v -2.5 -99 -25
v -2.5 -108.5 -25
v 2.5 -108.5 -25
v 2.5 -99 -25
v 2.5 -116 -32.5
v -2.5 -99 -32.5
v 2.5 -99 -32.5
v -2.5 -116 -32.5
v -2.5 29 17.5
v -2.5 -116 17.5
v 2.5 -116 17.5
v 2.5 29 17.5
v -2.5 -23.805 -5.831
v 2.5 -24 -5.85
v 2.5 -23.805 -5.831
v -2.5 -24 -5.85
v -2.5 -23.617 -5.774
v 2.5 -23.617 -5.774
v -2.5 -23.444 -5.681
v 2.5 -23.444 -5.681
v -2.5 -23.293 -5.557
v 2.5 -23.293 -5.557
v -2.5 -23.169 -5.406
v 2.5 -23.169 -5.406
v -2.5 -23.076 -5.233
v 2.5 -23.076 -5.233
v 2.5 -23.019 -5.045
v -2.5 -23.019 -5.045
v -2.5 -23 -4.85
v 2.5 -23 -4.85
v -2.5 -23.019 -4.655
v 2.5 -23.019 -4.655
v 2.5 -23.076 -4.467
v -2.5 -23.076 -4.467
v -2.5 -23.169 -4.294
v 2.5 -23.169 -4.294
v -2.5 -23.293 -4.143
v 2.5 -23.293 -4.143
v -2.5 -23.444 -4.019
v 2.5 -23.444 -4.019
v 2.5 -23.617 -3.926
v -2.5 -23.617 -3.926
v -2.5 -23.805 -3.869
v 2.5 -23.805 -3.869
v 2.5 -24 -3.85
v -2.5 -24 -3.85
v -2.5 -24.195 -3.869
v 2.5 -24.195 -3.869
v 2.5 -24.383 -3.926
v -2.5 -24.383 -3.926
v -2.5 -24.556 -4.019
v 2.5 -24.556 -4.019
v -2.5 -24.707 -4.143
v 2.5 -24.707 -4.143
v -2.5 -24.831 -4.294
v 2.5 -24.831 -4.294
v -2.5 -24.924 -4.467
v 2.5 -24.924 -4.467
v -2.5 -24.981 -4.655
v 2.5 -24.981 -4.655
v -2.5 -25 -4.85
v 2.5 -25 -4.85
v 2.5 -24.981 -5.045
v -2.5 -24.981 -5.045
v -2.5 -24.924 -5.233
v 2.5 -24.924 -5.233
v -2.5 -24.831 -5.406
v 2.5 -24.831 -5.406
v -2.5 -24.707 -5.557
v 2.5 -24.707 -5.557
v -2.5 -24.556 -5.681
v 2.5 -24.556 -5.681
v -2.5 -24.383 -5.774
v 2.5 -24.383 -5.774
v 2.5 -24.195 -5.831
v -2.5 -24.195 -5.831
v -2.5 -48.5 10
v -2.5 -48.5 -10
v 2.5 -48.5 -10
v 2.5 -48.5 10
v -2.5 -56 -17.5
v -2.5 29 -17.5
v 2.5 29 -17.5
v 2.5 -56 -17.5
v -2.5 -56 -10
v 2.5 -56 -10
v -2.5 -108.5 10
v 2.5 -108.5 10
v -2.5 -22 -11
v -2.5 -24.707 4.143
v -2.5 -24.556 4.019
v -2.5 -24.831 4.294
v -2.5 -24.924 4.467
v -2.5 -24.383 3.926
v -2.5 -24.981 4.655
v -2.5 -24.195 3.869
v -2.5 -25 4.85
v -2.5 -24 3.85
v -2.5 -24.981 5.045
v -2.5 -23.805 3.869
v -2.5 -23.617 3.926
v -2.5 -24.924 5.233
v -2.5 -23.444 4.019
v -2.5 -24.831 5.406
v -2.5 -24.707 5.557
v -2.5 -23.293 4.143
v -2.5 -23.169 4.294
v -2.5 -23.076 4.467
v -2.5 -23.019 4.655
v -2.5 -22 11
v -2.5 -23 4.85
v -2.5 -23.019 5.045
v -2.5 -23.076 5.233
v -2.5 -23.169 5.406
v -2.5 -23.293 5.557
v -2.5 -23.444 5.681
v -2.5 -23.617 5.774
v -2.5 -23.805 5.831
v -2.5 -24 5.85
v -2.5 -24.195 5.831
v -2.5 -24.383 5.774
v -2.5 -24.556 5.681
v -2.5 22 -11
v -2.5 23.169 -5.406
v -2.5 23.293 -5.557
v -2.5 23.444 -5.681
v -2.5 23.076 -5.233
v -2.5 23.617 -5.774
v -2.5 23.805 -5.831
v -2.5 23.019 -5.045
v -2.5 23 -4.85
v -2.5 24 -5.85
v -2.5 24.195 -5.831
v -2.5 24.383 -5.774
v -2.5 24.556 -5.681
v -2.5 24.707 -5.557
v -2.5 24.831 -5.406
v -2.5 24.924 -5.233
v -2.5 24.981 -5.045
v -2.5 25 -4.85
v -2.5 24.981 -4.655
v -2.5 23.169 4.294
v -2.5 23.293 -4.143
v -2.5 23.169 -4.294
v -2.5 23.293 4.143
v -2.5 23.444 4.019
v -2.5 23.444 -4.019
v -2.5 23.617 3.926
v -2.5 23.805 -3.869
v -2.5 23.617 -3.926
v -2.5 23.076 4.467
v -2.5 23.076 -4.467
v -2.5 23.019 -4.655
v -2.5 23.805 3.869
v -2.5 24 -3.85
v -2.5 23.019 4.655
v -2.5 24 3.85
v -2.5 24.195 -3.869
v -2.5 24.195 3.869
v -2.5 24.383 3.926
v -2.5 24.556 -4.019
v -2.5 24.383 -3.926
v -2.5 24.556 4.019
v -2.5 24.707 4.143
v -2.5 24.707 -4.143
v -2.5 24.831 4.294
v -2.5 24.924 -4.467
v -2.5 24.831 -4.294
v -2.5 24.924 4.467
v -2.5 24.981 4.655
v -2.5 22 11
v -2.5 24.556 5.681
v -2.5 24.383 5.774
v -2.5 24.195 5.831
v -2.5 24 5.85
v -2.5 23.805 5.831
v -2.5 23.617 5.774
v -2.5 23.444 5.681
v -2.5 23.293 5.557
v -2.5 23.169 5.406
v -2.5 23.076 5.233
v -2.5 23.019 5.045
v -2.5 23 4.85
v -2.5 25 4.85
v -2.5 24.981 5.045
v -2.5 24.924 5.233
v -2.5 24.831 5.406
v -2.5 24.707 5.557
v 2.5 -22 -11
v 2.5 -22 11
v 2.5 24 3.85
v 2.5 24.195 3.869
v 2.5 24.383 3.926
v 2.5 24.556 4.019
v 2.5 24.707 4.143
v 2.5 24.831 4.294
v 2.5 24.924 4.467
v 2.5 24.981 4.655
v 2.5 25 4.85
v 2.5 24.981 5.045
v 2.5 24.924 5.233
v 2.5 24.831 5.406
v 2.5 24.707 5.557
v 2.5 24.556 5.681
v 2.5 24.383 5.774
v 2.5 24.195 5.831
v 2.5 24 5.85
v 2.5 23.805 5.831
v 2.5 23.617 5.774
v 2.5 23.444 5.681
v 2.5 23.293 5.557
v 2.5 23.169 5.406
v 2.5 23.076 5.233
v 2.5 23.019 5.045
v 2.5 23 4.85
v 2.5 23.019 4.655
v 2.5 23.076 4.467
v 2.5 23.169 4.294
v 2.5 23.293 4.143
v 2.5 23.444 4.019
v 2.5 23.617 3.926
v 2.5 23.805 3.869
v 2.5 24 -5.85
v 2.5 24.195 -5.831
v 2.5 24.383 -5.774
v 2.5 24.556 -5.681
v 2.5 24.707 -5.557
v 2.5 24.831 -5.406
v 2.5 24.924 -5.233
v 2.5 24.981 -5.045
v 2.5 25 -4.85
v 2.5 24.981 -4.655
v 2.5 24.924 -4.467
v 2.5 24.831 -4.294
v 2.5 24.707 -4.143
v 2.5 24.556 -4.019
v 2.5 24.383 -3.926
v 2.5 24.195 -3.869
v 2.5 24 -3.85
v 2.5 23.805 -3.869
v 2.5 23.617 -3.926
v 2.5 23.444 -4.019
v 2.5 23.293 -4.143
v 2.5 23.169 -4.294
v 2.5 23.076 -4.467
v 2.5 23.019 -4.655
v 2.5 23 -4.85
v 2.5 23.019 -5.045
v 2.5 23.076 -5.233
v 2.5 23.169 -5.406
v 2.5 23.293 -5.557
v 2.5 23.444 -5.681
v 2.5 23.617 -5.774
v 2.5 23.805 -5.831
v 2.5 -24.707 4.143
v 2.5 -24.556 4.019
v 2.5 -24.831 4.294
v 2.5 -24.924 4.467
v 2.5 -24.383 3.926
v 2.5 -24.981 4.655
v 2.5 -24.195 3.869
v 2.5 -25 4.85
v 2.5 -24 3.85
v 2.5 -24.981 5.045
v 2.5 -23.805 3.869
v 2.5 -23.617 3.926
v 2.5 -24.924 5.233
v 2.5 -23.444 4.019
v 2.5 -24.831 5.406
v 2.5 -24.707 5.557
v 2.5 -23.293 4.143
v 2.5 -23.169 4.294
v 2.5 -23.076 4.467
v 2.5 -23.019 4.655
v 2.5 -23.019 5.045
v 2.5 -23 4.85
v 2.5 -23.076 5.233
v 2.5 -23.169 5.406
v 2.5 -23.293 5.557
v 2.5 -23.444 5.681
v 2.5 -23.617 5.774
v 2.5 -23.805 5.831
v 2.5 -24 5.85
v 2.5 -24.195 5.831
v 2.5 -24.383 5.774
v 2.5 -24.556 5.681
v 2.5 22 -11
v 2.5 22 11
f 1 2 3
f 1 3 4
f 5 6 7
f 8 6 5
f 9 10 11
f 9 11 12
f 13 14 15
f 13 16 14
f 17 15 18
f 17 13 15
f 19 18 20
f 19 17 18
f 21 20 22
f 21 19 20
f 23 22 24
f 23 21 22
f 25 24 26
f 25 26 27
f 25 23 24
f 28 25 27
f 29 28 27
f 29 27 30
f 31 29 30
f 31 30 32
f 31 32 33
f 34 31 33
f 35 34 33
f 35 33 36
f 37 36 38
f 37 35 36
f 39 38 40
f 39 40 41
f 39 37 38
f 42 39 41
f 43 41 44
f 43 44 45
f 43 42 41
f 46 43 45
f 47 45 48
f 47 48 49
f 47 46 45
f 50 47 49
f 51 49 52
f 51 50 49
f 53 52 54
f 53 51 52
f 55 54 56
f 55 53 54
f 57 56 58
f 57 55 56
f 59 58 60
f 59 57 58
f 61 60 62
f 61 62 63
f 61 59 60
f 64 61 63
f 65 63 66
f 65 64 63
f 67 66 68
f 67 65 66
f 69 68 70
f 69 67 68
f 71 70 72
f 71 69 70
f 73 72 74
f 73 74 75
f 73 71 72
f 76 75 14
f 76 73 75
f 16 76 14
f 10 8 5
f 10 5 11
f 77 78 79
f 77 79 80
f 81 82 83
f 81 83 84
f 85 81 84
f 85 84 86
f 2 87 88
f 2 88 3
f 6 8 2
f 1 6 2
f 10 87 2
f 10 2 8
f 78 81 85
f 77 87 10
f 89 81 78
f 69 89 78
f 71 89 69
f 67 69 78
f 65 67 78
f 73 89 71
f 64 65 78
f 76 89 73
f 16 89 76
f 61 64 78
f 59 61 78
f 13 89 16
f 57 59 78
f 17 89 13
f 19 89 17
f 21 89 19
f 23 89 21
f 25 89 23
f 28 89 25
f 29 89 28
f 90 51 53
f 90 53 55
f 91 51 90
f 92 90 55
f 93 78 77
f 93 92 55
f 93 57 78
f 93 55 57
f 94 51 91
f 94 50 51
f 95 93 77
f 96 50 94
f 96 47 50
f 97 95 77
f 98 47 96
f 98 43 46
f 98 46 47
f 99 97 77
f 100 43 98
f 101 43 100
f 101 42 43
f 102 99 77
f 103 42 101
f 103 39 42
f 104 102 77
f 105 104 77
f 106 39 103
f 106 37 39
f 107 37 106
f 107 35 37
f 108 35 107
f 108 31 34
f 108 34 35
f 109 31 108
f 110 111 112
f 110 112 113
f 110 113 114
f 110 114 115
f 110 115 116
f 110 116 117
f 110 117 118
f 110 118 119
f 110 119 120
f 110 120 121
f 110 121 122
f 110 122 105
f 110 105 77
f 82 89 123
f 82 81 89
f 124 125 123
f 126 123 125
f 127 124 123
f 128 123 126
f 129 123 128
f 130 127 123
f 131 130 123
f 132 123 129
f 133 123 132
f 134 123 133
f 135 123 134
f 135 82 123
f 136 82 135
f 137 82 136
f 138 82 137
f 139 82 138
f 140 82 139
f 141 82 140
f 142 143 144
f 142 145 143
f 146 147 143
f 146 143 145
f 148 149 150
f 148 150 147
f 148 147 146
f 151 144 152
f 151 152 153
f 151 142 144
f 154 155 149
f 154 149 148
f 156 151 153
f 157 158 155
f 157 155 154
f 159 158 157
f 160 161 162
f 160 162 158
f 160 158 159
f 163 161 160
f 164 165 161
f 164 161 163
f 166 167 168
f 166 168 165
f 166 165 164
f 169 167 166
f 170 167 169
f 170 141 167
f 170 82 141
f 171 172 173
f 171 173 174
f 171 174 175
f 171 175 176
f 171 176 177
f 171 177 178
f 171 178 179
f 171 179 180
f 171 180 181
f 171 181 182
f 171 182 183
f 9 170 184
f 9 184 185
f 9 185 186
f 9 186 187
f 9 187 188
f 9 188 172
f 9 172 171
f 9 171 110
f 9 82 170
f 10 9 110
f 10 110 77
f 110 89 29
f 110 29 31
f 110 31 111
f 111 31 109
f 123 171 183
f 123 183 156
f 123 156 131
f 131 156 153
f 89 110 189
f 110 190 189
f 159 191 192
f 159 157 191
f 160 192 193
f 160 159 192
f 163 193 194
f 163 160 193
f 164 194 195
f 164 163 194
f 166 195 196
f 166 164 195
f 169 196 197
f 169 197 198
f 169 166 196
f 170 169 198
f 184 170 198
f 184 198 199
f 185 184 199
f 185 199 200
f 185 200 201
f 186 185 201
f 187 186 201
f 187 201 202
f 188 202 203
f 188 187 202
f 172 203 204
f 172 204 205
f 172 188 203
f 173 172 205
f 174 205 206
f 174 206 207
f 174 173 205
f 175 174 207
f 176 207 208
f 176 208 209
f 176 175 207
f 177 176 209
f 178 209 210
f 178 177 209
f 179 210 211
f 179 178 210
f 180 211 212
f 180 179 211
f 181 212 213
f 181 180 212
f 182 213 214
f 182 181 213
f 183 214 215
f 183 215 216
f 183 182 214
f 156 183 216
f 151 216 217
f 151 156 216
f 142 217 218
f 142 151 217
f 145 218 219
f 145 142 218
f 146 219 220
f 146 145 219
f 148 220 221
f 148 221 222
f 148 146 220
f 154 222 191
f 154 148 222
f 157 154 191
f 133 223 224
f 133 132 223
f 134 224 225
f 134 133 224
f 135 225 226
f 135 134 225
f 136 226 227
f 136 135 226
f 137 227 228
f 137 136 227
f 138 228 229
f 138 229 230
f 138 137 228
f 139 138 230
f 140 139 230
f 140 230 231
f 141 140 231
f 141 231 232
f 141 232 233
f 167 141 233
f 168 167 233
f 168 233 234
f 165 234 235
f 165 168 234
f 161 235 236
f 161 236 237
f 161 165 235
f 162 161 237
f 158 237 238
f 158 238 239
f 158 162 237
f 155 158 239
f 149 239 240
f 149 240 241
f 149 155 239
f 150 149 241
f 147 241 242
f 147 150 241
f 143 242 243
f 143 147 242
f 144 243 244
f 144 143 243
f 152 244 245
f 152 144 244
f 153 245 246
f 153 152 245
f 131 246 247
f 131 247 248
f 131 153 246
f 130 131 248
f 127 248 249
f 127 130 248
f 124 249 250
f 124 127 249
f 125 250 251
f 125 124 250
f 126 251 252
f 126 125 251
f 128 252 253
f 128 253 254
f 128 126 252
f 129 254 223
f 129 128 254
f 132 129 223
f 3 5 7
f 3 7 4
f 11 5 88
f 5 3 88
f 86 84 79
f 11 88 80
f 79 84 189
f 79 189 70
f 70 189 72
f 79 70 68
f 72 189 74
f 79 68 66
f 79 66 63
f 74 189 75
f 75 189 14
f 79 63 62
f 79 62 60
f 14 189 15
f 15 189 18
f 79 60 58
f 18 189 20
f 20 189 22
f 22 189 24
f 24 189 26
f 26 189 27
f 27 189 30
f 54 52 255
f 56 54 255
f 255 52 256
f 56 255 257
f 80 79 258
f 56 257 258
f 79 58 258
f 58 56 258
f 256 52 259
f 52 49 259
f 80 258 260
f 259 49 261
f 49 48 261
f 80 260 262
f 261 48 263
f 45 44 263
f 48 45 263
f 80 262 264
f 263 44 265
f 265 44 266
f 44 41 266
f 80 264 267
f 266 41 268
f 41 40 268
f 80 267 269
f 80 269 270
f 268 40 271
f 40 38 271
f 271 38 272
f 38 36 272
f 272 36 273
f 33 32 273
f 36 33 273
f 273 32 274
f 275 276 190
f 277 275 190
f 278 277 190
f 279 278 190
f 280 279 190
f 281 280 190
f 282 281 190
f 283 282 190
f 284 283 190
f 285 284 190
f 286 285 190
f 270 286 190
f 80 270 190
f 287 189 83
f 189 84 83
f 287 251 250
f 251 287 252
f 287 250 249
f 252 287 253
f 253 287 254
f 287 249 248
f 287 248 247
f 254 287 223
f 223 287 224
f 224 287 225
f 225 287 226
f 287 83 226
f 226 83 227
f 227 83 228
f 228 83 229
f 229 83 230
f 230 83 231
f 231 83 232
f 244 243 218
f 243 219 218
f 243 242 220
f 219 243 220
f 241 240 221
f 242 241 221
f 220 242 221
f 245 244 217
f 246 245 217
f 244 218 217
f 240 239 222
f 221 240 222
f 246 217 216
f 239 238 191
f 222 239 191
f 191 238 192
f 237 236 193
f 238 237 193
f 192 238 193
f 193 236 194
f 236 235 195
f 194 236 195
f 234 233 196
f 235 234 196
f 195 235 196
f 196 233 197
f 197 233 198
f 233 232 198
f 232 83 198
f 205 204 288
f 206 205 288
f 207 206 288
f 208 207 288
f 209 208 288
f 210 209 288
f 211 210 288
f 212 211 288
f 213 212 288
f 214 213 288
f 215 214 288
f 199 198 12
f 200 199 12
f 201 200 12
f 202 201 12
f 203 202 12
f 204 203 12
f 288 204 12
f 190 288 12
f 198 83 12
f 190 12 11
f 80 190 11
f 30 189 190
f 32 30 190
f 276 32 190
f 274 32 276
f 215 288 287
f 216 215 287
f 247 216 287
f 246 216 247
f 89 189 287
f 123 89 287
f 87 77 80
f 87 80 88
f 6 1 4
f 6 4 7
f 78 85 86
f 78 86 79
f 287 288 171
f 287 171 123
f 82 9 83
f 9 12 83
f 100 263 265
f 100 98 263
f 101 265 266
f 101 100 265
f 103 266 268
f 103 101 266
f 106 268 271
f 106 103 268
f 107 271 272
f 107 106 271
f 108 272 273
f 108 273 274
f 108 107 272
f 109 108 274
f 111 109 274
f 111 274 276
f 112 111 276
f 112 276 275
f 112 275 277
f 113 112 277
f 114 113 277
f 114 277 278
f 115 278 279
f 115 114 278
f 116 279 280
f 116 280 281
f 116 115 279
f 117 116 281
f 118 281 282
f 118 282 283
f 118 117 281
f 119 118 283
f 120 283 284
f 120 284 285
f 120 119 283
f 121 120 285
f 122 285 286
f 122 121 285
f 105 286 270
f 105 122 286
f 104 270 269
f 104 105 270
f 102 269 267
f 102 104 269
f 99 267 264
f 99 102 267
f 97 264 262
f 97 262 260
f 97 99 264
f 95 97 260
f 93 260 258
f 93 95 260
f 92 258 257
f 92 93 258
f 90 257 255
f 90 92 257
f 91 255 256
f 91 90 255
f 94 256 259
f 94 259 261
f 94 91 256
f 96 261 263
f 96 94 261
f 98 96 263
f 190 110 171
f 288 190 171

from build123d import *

# Parameters (mm, degrees)
SKETCH1_W           = 35
SKETCH1_H           = 70
SKETCH1_R           = 1
SKETCH1_W_2         = 22
SKETCH1_H_2         = 44
BOSS_EXTRUDE1_DEPTH = 2.5
BOSS_EXTRUDE2_START = -2.5
BOSS_EXTRUDE2_DEPTH = 5


with BuildPart() as part:
    # Sketch1 → Boss-Extrude1 (new, symmetric)
    with BuildSketch(Plane(origin=(0, 0, 0), x_dir=(0, 0, -1), z_dir=(1, 0, 0))):
        with Locations((0, -6)):
            Rectangle(SKETCH1_W, SKETCH1_H)
        with Locations((-4.85, -24)):
            Circle(SKETCH1_R, mode=Mode.SUBTRACT)
        with Locations((4.85, -24)):
            Circle(SKETCH1_R, mode=Mode.SUBTRACT)
        with Locations((4.85, 24)):
            Circle(SKETCH1_R, mode=Mode.SUBTRACT)
        with Locations((-4.85, 24)):
            Circle(SKETCH1_R, mode=Mode.SUBTRACT)
        Rectangle(SKETCH1_W_2, SKETCH1_H_2, mode=Mode.SUBTRACT)
    extrude(amount=BOSS_EXTRUDE1_DEPTH, both=True)

    # Sketch2 → Boss-Extrude2 (add)
    with BuildSketch(Plane(origin=(0, 0, 0), x_dir=(0, 0, -1), z_dir=(1, 0, 0)).offset(BOSS_EXTRUDE2_START)):
        Polygon((17.5, -41), (17.5, -56), (10, -56), (10, -48.5), (-10, -48.5), (-10, -108.5), (25, -108.5), (25, -99), (32.5, -99), (32.5, -116), (-17.5, -116), (-17.5, -41), align=None)
    extrude(amount=BOSS_EXTRUDE2_DEPTH)


solid = part.part
